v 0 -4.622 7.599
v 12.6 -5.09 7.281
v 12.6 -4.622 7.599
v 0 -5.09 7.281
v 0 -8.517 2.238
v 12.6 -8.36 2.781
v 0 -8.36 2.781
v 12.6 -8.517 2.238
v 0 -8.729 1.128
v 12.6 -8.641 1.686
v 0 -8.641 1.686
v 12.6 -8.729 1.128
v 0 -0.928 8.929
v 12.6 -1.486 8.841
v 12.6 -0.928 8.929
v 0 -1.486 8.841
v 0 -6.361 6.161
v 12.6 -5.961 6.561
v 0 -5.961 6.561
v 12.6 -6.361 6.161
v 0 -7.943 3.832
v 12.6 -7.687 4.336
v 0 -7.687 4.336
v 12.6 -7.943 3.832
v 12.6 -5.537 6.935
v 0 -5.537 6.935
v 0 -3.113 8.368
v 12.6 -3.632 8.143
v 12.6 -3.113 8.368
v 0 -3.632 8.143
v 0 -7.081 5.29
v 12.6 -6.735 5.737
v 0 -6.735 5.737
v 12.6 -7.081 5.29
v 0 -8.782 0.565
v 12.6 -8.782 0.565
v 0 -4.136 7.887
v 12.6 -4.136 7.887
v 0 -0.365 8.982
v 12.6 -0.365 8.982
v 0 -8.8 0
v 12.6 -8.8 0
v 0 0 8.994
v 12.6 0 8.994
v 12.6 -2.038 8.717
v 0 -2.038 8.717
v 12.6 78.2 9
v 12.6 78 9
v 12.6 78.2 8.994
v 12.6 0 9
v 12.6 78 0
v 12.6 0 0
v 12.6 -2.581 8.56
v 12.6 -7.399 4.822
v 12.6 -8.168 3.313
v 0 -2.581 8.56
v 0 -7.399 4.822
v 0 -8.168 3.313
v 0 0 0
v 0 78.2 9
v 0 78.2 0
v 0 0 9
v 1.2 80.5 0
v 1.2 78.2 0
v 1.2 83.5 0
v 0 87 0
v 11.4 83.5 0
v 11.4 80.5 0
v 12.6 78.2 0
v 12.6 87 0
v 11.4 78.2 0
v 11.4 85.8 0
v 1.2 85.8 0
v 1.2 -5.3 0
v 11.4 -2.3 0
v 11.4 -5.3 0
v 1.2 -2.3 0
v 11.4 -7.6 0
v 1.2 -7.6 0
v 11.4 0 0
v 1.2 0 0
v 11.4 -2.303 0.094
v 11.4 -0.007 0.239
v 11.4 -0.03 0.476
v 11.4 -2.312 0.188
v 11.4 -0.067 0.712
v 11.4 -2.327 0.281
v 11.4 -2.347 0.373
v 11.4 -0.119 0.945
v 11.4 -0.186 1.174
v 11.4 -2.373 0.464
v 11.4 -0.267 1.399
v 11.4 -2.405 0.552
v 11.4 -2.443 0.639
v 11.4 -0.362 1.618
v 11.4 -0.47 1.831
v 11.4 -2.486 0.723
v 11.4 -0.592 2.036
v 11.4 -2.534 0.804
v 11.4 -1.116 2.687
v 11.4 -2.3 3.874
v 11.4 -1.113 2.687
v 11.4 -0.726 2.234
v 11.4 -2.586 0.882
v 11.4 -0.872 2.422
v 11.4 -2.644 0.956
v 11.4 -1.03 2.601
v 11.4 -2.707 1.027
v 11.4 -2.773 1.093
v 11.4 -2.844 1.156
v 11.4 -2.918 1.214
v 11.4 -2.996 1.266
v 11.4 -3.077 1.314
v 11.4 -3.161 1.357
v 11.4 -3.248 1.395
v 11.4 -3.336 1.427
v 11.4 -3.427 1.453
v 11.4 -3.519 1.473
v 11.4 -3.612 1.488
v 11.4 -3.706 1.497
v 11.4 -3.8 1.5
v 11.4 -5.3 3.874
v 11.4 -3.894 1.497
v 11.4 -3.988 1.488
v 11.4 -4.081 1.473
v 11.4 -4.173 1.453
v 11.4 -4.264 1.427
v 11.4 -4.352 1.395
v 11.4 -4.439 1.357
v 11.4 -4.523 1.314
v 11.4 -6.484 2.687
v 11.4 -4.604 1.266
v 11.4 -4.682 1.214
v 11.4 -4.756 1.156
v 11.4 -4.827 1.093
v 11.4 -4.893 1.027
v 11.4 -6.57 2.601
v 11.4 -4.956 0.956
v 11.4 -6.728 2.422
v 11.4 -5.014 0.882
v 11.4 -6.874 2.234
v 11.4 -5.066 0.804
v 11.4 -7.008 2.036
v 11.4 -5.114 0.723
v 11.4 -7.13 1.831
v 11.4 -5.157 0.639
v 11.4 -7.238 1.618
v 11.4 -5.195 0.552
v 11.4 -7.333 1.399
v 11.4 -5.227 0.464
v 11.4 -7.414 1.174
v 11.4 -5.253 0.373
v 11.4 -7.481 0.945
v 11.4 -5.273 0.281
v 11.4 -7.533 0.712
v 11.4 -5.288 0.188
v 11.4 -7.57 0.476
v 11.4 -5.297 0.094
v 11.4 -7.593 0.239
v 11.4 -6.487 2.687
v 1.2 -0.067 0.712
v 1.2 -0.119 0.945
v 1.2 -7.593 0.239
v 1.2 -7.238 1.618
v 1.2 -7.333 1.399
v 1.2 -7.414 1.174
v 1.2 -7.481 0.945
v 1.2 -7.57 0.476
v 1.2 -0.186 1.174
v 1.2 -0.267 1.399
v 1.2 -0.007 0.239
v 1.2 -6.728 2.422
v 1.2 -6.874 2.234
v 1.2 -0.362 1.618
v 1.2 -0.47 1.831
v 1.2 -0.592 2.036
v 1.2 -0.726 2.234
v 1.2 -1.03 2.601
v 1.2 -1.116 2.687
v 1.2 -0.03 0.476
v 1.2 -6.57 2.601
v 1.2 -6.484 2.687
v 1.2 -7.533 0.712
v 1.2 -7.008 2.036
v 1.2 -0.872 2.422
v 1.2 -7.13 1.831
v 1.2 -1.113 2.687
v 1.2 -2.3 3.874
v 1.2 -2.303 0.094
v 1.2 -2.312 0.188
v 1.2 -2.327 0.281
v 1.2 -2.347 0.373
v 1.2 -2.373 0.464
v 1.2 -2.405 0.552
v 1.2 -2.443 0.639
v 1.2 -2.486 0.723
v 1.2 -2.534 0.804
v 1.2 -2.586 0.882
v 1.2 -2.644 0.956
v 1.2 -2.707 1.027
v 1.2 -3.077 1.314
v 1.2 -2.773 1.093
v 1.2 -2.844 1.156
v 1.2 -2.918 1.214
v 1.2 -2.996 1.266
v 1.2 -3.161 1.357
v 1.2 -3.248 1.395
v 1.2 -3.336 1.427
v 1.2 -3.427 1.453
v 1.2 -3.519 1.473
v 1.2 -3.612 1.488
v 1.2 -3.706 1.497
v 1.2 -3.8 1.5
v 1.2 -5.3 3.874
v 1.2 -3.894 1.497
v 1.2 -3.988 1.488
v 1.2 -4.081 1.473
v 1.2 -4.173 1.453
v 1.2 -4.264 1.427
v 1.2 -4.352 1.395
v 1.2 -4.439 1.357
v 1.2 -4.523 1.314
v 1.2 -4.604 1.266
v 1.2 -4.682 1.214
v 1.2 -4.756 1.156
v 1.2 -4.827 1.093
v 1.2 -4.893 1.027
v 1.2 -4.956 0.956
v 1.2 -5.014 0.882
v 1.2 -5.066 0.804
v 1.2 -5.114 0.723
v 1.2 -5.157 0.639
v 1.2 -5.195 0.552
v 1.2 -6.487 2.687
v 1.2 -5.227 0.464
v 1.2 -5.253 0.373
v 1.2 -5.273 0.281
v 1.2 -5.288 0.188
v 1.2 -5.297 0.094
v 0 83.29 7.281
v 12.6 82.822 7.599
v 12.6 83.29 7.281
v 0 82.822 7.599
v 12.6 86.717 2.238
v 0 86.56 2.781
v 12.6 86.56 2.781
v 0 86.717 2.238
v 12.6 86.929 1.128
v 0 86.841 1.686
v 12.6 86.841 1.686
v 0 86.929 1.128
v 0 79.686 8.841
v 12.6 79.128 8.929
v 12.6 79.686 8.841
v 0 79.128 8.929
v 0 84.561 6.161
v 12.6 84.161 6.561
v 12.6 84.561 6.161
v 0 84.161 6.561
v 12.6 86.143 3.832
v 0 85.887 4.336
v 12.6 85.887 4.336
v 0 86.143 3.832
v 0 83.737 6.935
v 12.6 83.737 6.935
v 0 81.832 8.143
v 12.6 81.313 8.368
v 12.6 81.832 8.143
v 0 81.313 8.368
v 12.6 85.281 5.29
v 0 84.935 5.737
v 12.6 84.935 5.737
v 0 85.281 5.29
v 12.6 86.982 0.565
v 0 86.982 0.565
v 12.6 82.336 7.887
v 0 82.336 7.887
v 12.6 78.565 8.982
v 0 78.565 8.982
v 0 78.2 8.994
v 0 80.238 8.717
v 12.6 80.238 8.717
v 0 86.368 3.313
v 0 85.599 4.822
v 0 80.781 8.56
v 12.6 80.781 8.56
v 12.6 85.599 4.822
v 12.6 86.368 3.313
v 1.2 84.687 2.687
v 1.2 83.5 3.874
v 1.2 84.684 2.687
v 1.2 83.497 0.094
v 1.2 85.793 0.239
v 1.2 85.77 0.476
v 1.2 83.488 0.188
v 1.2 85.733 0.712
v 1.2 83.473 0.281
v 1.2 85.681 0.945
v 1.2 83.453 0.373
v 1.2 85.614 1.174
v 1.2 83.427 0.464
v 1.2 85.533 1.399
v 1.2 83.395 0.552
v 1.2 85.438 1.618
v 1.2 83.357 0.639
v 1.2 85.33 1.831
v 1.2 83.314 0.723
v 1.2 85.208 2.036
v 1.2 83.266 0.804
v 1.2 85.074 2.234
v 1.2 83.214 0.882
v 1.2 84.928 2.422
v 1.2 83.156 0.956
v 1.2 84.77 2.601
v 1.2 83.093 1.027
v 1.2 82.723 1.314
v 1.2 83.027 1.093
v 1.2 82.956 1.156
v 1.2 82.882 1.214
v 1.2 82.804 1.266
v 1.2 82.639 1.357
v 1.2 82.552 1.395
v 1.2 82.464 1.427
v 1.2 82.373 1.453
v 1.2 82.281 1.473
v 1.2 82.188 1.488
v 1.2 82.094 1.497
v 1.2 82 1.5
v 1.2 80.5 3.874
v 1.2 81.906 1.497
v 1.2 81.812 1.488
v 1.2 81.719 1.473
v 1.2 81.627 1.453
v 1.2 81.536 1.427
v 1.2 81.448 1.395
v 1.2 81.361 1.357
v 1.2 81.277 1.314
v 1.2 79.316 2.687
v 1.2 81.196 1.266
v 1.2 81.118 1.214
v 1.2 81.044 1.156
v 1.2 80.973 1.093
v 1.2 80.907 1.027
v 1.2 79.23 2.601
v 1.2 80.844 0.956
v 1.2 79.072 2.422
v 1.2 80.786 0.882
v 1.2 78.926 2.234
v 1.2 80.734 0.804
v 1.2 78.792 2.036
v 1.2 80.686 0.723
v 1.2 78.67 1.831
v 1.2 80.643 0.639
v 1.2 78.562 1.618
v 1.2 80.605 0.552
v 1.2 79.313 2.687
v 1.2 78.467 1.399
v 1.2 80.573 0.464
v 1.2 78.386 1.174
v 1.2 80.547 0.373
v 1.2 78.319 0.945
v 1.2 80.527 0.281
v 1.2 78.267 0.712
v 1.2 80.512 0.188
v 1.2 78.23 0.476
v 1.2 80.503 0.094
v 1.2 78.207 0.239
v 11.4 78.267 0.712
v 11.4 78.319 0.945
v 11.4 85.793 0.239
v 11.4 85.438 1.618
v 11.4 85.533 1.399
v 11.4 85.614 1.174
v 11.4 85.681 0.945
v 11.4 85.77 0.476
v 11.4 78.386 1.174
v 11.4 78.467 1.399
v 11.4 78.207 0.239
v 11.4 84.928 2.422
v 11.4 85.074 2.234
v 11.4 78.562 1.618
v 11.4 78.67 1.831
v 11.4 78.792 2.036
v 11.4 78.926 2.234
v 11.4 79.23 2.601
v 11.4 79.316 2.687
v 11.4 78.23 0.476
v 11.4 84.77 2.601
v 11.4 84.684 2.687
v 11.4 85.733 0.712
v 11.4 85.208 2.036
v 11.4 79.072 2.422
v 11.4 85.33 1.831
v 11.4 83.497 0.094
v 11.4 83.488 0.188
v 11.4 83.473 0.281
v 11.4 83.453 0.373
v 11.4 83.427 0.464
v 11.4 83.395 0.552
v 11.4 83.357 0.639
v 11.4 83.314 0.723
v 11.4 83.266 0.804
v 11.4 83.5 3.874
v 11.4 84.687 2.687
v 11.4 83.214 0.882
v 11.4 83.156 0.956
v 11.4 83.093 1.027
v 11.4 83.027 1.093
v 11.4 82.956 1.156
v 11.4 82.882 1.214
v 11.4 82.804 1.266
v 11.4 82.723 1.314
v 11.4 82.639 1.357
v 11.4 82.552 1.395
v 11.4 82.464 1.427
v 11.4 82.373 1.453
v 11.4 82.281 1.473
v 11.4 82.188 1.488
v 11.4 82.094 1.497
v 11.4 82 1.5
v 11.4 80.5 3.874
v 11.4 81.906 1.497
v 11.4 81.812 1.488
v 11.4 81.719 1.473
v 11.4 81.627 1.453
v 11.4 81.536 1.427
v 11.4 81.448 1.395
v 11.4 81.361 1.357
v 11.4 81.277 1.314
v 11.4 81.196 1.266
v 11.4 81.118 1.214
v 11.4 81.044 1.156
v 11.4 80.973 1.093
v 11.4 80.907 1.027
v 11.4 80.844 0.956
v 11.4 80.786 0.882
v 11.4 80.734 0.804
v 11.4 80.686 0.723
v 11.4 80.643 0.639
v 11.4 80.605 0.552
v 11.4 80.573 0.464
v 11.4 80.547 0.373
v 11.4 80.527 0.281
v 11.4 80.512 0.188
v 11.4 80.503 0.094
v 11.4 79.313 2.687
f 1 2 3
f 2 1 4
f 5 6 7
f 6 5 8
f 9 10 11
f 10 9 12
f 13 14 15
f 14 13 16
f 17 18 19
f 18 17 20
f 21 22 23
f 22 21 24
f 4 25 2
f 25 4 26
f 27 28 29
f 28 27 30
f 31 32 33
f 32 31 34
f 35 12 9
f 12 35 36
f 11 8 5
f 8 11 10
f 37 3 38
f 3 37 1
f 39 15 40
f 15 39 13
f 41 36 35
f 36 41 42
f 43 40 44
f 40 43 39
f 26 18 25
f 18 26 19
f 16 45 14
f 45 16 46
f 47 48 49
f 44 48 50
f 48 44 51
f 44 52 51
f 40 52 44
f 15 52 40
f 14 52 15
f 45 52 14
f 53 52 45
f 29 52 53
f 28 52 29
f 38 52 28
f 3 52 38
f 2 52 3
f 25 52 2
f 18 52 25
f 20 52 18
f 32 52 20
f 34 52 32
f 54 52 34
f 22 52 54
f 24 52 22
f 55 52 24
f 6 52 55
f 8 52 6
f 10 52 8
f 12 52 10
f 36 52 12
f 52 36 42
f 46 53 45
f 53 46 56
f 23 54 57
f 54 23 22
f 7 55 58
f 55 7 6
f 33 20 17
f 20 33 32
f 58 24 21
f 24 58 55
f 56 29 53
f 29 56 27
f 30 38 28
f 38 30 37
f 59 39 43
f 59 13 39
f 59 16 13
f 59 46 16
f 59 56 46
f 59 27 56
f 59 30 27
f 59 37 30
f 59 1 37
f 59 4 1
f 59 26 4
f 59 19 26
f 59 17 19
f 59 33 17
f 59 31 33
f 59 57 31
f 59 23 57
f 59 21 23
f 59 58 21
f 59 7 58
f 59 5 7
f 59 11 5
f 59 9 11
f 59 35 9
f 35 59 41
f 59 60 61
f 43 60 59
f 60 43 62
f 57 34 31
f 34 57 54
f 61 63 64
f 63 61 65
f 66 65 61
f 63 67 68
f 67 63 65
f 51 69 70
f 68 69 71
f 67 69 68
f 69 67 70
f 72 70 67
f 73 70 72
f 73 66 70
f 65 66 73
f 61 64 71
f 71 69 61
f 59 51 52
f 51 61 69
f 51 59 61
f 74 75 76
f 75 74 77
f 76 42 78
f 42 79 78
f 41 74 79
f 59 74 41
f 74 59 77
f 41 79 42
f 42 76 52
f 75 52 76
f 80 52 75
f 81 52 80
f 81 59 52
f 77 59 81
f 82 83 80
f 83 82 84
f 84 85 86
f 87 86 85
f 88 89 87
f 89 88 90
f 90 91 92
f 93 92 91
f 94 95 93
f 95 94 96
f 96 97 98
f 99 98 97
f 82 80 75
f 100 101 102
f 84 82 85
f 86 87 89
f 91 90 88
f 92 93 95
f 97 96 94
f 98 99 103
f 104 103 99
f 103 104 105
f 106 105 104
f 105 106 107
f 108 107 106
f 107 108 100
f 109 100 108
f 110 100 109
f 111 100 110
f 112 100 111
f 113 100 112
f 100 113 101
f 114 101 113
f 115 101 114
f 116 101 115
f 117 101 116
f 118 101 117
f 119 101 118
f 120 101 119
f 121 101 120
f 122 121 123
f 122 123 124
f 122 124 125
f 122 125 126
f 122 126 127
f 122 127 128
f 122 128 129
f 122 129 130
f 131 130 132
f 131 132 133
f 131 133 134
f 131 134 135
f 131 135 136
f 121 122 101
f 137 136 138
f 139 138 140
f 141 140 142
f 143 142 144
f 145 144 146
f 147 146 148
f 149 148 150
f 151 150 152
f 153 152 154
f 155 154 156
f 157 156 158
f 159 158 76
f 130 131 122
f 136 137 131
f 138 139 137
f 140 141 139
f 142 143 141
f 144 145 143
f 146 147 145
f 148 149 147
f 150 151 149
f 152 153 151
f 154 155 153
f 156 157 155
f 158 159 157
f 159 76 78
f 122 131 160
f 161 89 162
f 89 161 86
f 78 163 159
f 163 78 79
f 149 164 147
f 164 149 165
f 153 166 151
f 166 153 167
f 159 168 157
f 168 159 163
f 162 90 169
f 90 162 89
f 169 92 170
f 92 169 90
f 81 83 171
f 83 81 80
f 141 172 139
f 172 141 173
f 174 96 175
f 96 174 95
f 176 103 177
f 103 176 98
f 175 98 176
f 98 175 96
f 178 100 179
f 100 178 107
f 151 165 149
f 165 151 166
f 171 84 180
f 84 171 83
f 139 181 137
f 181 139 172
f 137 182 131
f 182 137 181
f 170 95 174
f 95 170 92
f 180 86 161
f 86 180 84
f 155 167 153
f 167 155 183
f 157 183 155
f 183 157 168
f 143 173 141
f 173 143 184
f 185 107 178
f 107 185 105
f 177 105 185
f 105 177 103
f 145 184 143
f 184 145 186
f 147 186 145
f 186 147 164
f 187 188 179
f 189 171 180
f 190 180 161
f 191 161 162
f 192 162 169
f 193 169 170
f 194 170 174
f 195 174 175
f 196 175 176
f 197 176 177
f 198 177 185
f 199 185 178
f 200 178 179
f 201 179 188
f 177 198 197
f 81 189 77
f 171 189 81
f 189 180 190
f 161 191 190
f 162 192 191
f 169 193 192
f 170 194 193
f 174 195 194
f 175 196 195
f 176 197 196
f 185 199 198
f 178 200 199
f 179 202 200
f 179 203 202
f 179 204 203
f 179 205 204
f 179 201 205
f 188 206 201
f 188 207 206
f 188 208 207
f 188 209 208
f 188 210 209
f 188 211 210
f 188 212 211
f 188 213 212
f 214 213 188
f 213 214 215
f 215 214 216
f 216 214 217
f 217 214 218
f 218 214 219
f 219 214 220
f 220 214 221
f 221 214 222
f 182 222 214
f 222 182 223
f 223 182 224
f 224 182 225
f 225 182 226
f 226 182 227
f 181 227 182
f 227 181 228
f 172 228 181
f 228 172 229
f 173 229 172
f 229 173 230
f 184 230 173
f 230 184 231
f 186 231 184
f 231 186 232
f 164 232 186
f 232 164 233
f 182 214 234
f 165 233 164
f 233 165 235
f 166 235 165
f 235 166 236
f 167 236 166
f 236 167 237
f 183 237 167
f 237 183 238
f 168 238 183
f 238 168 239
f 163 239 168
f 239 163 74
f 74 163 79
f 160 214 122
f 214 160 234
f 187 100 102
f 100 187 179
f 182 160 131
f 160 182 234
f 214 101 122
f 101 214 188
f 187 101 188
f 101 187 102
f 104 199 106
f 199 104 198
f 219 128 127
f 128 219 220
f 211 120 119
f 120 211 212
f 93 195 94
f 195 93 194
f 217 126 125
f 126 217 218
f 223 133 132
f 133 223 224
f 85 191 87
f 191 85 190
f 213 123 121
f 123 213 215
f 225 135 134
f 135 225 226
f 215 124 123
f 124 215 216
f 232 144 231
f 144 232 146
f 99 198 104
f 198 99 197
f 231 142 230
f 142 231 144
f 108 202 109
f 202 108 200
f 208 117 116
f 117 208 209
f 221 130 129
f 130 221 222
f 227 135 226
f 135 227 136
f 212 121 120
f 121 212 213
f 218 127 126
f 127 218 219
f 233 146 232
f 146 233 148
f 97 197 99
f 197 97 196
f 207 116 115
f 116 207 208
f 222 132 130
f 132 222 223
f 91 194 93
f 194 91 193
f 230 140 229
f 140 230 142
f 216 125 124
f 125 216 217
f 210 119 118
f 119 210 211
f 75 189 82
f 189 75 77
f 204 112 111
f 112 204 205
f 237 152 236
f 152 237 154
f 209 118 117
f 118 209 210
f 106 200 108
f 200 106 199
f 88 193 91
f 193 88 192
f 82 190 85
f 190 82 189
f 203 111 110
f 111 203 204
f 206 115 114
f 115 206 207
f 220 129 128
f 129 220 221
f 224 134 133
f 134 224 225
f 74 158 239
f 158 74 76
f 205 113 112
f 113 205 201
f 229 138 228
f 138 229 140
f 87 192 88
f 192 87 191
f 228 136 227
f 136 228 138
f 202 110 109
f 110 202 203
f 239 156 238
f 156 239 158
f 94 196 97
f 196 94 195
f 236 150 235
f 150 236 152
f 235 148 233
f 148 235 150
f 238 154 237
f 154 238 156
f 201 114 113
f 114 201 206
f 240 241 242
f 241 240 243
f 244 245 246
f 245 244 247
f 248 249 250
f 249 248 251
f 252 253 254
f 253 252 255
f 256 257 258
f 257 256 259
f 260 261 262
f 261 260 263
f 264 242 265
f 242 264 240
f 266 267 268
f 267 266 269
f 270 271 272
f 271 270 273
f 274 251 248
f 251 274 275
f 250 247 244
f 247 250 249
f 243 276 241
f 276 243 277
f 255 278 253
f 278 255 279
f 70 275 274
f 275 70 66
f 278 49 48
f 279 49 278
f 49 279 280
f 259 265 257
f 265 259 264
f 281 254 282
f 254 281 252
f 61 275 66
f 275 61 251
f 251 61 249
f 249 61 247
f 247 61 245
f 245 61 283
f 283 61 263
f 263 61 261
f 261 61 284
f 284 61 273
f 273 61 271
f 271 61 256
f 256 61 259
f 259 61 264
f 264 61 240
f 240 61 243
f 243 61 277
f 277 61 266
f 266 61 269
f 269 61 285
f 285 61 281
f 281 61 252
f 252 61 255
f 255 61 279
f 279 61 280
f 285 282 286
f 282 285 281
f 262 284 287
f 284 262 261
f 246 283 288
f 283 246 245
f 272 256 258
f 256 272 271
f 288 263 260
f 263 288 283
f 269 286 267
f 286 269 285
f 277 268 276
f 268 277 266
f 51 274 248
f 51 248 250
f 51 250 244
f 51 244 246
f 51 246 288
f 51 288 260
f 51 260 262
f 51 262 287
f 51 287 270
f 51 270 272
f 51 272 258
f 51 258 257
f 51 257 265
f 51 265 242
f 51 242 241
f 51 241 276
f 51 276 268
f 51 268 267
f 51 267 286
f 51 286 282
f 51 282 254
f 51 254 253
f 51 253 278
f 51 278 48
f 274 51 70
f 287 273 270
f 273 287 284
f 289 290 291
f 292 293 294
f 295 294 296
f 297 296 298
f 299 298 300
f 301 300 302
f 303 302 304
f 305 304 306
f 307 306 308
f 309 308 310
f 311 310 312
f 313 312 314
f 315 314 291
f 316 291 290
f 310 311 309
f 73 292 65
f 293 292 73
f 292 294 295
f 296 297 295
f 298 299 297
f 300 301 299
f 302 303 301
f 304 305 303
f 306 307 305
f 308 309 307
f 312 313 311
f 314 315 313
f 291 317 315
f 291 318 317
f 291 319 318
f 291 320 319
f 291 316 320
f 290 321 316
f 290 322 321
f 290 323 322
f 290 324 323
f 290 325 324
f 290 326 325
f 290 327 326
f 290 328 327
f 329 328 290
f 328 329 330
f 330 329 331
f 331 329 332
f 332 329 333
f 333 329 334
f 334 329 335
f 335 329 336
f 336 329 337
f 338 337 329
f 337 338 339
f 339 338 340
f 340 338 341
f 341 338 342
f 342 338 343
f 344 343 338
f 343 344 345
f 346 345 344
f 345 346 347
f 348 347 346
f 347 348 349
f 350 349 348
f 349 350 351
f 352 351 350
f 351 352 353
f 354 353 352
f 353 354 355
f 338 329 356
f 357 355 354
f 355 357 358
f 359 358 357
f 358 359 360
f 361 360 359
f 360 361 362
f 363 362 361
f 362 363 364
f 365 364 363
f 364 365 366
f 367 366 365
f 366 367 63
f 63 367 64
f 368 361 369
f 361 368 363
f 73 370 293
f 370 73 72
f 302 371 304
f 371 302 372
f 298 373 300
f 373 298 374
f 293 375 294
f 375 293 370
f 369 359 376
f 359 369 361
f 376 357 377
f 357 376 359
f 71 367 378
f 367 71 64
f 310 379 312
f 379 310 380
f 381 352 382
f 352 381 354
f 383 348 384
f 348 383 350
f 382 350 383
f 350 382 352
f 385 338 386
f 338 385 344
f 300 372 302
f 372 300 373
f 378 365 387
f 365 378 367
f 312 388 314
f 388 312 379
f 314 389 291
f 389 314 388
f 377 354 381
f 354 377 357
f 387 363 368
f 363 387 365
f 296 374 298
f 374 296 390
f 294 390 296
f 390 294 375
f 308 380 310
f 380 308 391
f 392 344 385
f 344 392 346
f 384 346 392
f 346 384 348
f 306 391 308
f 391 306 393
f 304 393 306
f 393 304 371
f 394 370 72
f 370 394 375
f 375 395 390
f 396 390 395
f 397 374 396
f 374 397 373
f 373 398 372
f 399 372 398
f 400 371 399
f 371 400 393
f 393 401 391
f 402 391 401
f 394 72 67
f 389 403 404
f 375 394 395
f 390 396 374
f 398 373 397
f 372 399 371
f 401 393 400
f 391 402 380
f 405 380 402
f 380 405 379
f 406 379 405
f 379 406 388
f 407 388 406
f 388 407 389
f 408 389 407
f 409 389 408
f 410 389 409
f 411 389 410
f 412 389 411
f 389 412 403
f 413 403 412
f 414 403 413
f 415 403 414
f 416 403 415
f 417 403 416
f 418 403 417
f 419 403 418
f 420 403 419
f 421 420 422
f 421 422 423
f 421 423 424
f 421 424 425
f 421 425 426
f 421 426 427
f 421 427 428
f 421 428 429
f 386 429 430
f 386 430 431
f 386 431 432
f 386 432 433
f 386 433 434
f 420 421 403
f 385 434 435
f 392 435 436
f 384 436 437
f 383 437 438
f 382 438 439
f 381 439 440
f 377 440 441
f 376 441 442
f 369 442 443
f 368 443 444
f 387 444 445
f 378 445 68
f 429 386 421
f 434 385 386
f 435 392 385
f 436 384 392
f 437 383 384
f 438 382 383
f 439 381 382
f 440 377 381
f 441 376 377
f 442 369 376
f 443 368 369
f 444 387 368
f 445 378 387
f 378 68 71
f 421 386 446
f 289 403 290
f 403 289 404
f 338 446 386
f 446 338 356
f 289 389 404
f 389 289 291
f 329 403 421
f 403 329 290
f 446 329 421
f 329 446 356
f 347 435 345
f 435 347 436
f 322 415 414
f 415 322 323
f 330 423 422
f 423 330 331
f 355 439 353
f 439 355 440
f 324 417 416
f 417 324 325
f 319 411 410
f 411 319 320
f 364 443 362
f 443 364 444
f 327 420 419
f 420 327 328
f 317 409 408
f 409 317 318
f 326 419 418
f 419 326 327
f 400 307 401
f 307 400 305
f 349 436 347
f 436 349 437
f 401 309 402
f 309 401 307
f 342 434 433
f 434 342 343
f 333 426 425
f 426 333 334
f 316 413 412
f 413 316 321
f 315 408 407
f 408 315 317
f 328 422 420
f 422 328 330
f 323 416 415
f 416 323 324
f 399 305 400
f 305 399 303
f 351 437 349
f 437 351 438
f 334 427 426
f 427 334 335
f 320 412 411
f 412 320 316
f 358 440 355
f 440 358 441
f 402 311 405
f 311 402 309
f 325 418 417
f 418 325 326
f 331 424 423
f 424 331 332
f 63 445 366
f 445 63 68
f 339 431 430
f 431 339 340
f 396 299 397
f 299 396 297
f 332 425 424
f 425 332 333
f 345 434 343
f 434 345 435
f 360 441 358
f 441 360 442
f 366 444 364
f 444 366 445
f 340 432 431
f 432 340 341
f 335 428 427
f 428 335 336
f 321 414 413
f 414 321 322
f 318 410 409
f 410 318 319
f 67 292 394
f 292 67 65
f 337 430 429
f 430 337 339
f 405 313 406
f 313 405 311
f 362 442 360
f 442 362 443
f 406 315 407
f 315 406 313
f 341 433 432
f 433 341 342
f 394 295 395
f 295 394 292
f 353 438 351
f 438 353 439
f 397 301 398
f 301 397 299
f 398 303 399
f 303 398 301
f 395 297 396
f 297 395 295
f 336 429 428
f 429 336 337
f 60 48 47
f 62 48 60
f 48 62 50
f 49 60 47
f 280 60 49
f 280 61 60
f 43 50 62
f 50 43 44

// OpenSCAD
// Attachment point for nylon/velcrow band
// Assumed 0.2 y overlap for union (half of connect)
// Assumed no support or support to bed only
// If your printer cannot bridge a gap the width of the strap
//  you are going to use, set flat_top to false
$fn = 100;
FUDGE = 0.001;

module attachOuter(w, lug_d, wall=1.2, strap_gap=2.3, connect=0.4) {
  l = w + wall*2;
  d = lug_d*2+strap_gap*4+wall*2+connect;
  difference() {
    rotate([0, 90, 0])
      cylinder(h=l, d=d);
    translate([-FUDGE, 0, -d*1.5])
      cube([l*2, d*2, d*3]);
    translate([-FUDGE, -d*2, -d*2])
      cube([l*2, d*4, d*2]);
  }
}

module cutout(w, lug_d, strap_gap, flat_top=true) {
  d = lug_d+strap_gap*2;
  union() {
    rotate([0, 90, 0])
      cylinder(h=w, d=d);
    translate([0, 0, sqrt((d/2*d/2)/2)])
      rotate([90, 0, 90])
        linear_extrude(w)
          if (flat_top) {
            polygon([[-sqrt((d/2*d/2)/2), 0],
                    [sqrt((d/2*d/2)/2), 0],
                    [lug_d/2, sqrt((d/2*d/2)/2)-lug_d/2],
                    [-lug_d/2, sqrt((d/2*d/2)/2)-lug_d/2],
                    [-sqrt((d/2*d/2)/2), 0]]);
          } else {
            polygon([[-sqrt((d/2*d/2)/2), 0],
                    [sqrt((d/2*d/2)/2), 0],
                    [0, sqrt((d/2*d/2)/2)],
                    [-sqrt((d/2*d/2)/2), 0]]);
          }
  }
}

module attach(w, lug_d, wall=1.2, strap_gap=2.3, connect=0.4,
              flat_top=true) {
  l = w + wall*2;
  d = lug_d*2+strap_gap*4+wall*2+connect;
  union() {
    difference() {
      attachOuter(w, lug_d, wall=1.2, strap_gap=2.3, connect=0.4);
      translate([wall, -(lug+strap_gap*2+connect)/2, 0])
        cutout(w, lug_d, strap_gap);
    }
    translate([0, -(lug+strap_gap*2+connect)/2, 0])
      difference() {
        rotate([0, 90, 0])
          cylinder(h=l, d=lug_d);
        translate([-FUDGE, -lug_d*2, -lug_d*2])
          cube([l*2, lug_d*4, lug_d*2]);
      }
  }
}

lug = 3.0;
width = 10.2;
strap_gap = 2.3;
wall = 1.2;
union() {
  translate([0, 0.2, 0])
  attach(width, lug);
  cube([width+2*wall, 78.2, lug+strap_gap*2+wall+0.2]);
  translate([width+2*wall, 78.2-0.2, 0])
    rotate([0, 0, 180])
      attach(width, lug);
}
